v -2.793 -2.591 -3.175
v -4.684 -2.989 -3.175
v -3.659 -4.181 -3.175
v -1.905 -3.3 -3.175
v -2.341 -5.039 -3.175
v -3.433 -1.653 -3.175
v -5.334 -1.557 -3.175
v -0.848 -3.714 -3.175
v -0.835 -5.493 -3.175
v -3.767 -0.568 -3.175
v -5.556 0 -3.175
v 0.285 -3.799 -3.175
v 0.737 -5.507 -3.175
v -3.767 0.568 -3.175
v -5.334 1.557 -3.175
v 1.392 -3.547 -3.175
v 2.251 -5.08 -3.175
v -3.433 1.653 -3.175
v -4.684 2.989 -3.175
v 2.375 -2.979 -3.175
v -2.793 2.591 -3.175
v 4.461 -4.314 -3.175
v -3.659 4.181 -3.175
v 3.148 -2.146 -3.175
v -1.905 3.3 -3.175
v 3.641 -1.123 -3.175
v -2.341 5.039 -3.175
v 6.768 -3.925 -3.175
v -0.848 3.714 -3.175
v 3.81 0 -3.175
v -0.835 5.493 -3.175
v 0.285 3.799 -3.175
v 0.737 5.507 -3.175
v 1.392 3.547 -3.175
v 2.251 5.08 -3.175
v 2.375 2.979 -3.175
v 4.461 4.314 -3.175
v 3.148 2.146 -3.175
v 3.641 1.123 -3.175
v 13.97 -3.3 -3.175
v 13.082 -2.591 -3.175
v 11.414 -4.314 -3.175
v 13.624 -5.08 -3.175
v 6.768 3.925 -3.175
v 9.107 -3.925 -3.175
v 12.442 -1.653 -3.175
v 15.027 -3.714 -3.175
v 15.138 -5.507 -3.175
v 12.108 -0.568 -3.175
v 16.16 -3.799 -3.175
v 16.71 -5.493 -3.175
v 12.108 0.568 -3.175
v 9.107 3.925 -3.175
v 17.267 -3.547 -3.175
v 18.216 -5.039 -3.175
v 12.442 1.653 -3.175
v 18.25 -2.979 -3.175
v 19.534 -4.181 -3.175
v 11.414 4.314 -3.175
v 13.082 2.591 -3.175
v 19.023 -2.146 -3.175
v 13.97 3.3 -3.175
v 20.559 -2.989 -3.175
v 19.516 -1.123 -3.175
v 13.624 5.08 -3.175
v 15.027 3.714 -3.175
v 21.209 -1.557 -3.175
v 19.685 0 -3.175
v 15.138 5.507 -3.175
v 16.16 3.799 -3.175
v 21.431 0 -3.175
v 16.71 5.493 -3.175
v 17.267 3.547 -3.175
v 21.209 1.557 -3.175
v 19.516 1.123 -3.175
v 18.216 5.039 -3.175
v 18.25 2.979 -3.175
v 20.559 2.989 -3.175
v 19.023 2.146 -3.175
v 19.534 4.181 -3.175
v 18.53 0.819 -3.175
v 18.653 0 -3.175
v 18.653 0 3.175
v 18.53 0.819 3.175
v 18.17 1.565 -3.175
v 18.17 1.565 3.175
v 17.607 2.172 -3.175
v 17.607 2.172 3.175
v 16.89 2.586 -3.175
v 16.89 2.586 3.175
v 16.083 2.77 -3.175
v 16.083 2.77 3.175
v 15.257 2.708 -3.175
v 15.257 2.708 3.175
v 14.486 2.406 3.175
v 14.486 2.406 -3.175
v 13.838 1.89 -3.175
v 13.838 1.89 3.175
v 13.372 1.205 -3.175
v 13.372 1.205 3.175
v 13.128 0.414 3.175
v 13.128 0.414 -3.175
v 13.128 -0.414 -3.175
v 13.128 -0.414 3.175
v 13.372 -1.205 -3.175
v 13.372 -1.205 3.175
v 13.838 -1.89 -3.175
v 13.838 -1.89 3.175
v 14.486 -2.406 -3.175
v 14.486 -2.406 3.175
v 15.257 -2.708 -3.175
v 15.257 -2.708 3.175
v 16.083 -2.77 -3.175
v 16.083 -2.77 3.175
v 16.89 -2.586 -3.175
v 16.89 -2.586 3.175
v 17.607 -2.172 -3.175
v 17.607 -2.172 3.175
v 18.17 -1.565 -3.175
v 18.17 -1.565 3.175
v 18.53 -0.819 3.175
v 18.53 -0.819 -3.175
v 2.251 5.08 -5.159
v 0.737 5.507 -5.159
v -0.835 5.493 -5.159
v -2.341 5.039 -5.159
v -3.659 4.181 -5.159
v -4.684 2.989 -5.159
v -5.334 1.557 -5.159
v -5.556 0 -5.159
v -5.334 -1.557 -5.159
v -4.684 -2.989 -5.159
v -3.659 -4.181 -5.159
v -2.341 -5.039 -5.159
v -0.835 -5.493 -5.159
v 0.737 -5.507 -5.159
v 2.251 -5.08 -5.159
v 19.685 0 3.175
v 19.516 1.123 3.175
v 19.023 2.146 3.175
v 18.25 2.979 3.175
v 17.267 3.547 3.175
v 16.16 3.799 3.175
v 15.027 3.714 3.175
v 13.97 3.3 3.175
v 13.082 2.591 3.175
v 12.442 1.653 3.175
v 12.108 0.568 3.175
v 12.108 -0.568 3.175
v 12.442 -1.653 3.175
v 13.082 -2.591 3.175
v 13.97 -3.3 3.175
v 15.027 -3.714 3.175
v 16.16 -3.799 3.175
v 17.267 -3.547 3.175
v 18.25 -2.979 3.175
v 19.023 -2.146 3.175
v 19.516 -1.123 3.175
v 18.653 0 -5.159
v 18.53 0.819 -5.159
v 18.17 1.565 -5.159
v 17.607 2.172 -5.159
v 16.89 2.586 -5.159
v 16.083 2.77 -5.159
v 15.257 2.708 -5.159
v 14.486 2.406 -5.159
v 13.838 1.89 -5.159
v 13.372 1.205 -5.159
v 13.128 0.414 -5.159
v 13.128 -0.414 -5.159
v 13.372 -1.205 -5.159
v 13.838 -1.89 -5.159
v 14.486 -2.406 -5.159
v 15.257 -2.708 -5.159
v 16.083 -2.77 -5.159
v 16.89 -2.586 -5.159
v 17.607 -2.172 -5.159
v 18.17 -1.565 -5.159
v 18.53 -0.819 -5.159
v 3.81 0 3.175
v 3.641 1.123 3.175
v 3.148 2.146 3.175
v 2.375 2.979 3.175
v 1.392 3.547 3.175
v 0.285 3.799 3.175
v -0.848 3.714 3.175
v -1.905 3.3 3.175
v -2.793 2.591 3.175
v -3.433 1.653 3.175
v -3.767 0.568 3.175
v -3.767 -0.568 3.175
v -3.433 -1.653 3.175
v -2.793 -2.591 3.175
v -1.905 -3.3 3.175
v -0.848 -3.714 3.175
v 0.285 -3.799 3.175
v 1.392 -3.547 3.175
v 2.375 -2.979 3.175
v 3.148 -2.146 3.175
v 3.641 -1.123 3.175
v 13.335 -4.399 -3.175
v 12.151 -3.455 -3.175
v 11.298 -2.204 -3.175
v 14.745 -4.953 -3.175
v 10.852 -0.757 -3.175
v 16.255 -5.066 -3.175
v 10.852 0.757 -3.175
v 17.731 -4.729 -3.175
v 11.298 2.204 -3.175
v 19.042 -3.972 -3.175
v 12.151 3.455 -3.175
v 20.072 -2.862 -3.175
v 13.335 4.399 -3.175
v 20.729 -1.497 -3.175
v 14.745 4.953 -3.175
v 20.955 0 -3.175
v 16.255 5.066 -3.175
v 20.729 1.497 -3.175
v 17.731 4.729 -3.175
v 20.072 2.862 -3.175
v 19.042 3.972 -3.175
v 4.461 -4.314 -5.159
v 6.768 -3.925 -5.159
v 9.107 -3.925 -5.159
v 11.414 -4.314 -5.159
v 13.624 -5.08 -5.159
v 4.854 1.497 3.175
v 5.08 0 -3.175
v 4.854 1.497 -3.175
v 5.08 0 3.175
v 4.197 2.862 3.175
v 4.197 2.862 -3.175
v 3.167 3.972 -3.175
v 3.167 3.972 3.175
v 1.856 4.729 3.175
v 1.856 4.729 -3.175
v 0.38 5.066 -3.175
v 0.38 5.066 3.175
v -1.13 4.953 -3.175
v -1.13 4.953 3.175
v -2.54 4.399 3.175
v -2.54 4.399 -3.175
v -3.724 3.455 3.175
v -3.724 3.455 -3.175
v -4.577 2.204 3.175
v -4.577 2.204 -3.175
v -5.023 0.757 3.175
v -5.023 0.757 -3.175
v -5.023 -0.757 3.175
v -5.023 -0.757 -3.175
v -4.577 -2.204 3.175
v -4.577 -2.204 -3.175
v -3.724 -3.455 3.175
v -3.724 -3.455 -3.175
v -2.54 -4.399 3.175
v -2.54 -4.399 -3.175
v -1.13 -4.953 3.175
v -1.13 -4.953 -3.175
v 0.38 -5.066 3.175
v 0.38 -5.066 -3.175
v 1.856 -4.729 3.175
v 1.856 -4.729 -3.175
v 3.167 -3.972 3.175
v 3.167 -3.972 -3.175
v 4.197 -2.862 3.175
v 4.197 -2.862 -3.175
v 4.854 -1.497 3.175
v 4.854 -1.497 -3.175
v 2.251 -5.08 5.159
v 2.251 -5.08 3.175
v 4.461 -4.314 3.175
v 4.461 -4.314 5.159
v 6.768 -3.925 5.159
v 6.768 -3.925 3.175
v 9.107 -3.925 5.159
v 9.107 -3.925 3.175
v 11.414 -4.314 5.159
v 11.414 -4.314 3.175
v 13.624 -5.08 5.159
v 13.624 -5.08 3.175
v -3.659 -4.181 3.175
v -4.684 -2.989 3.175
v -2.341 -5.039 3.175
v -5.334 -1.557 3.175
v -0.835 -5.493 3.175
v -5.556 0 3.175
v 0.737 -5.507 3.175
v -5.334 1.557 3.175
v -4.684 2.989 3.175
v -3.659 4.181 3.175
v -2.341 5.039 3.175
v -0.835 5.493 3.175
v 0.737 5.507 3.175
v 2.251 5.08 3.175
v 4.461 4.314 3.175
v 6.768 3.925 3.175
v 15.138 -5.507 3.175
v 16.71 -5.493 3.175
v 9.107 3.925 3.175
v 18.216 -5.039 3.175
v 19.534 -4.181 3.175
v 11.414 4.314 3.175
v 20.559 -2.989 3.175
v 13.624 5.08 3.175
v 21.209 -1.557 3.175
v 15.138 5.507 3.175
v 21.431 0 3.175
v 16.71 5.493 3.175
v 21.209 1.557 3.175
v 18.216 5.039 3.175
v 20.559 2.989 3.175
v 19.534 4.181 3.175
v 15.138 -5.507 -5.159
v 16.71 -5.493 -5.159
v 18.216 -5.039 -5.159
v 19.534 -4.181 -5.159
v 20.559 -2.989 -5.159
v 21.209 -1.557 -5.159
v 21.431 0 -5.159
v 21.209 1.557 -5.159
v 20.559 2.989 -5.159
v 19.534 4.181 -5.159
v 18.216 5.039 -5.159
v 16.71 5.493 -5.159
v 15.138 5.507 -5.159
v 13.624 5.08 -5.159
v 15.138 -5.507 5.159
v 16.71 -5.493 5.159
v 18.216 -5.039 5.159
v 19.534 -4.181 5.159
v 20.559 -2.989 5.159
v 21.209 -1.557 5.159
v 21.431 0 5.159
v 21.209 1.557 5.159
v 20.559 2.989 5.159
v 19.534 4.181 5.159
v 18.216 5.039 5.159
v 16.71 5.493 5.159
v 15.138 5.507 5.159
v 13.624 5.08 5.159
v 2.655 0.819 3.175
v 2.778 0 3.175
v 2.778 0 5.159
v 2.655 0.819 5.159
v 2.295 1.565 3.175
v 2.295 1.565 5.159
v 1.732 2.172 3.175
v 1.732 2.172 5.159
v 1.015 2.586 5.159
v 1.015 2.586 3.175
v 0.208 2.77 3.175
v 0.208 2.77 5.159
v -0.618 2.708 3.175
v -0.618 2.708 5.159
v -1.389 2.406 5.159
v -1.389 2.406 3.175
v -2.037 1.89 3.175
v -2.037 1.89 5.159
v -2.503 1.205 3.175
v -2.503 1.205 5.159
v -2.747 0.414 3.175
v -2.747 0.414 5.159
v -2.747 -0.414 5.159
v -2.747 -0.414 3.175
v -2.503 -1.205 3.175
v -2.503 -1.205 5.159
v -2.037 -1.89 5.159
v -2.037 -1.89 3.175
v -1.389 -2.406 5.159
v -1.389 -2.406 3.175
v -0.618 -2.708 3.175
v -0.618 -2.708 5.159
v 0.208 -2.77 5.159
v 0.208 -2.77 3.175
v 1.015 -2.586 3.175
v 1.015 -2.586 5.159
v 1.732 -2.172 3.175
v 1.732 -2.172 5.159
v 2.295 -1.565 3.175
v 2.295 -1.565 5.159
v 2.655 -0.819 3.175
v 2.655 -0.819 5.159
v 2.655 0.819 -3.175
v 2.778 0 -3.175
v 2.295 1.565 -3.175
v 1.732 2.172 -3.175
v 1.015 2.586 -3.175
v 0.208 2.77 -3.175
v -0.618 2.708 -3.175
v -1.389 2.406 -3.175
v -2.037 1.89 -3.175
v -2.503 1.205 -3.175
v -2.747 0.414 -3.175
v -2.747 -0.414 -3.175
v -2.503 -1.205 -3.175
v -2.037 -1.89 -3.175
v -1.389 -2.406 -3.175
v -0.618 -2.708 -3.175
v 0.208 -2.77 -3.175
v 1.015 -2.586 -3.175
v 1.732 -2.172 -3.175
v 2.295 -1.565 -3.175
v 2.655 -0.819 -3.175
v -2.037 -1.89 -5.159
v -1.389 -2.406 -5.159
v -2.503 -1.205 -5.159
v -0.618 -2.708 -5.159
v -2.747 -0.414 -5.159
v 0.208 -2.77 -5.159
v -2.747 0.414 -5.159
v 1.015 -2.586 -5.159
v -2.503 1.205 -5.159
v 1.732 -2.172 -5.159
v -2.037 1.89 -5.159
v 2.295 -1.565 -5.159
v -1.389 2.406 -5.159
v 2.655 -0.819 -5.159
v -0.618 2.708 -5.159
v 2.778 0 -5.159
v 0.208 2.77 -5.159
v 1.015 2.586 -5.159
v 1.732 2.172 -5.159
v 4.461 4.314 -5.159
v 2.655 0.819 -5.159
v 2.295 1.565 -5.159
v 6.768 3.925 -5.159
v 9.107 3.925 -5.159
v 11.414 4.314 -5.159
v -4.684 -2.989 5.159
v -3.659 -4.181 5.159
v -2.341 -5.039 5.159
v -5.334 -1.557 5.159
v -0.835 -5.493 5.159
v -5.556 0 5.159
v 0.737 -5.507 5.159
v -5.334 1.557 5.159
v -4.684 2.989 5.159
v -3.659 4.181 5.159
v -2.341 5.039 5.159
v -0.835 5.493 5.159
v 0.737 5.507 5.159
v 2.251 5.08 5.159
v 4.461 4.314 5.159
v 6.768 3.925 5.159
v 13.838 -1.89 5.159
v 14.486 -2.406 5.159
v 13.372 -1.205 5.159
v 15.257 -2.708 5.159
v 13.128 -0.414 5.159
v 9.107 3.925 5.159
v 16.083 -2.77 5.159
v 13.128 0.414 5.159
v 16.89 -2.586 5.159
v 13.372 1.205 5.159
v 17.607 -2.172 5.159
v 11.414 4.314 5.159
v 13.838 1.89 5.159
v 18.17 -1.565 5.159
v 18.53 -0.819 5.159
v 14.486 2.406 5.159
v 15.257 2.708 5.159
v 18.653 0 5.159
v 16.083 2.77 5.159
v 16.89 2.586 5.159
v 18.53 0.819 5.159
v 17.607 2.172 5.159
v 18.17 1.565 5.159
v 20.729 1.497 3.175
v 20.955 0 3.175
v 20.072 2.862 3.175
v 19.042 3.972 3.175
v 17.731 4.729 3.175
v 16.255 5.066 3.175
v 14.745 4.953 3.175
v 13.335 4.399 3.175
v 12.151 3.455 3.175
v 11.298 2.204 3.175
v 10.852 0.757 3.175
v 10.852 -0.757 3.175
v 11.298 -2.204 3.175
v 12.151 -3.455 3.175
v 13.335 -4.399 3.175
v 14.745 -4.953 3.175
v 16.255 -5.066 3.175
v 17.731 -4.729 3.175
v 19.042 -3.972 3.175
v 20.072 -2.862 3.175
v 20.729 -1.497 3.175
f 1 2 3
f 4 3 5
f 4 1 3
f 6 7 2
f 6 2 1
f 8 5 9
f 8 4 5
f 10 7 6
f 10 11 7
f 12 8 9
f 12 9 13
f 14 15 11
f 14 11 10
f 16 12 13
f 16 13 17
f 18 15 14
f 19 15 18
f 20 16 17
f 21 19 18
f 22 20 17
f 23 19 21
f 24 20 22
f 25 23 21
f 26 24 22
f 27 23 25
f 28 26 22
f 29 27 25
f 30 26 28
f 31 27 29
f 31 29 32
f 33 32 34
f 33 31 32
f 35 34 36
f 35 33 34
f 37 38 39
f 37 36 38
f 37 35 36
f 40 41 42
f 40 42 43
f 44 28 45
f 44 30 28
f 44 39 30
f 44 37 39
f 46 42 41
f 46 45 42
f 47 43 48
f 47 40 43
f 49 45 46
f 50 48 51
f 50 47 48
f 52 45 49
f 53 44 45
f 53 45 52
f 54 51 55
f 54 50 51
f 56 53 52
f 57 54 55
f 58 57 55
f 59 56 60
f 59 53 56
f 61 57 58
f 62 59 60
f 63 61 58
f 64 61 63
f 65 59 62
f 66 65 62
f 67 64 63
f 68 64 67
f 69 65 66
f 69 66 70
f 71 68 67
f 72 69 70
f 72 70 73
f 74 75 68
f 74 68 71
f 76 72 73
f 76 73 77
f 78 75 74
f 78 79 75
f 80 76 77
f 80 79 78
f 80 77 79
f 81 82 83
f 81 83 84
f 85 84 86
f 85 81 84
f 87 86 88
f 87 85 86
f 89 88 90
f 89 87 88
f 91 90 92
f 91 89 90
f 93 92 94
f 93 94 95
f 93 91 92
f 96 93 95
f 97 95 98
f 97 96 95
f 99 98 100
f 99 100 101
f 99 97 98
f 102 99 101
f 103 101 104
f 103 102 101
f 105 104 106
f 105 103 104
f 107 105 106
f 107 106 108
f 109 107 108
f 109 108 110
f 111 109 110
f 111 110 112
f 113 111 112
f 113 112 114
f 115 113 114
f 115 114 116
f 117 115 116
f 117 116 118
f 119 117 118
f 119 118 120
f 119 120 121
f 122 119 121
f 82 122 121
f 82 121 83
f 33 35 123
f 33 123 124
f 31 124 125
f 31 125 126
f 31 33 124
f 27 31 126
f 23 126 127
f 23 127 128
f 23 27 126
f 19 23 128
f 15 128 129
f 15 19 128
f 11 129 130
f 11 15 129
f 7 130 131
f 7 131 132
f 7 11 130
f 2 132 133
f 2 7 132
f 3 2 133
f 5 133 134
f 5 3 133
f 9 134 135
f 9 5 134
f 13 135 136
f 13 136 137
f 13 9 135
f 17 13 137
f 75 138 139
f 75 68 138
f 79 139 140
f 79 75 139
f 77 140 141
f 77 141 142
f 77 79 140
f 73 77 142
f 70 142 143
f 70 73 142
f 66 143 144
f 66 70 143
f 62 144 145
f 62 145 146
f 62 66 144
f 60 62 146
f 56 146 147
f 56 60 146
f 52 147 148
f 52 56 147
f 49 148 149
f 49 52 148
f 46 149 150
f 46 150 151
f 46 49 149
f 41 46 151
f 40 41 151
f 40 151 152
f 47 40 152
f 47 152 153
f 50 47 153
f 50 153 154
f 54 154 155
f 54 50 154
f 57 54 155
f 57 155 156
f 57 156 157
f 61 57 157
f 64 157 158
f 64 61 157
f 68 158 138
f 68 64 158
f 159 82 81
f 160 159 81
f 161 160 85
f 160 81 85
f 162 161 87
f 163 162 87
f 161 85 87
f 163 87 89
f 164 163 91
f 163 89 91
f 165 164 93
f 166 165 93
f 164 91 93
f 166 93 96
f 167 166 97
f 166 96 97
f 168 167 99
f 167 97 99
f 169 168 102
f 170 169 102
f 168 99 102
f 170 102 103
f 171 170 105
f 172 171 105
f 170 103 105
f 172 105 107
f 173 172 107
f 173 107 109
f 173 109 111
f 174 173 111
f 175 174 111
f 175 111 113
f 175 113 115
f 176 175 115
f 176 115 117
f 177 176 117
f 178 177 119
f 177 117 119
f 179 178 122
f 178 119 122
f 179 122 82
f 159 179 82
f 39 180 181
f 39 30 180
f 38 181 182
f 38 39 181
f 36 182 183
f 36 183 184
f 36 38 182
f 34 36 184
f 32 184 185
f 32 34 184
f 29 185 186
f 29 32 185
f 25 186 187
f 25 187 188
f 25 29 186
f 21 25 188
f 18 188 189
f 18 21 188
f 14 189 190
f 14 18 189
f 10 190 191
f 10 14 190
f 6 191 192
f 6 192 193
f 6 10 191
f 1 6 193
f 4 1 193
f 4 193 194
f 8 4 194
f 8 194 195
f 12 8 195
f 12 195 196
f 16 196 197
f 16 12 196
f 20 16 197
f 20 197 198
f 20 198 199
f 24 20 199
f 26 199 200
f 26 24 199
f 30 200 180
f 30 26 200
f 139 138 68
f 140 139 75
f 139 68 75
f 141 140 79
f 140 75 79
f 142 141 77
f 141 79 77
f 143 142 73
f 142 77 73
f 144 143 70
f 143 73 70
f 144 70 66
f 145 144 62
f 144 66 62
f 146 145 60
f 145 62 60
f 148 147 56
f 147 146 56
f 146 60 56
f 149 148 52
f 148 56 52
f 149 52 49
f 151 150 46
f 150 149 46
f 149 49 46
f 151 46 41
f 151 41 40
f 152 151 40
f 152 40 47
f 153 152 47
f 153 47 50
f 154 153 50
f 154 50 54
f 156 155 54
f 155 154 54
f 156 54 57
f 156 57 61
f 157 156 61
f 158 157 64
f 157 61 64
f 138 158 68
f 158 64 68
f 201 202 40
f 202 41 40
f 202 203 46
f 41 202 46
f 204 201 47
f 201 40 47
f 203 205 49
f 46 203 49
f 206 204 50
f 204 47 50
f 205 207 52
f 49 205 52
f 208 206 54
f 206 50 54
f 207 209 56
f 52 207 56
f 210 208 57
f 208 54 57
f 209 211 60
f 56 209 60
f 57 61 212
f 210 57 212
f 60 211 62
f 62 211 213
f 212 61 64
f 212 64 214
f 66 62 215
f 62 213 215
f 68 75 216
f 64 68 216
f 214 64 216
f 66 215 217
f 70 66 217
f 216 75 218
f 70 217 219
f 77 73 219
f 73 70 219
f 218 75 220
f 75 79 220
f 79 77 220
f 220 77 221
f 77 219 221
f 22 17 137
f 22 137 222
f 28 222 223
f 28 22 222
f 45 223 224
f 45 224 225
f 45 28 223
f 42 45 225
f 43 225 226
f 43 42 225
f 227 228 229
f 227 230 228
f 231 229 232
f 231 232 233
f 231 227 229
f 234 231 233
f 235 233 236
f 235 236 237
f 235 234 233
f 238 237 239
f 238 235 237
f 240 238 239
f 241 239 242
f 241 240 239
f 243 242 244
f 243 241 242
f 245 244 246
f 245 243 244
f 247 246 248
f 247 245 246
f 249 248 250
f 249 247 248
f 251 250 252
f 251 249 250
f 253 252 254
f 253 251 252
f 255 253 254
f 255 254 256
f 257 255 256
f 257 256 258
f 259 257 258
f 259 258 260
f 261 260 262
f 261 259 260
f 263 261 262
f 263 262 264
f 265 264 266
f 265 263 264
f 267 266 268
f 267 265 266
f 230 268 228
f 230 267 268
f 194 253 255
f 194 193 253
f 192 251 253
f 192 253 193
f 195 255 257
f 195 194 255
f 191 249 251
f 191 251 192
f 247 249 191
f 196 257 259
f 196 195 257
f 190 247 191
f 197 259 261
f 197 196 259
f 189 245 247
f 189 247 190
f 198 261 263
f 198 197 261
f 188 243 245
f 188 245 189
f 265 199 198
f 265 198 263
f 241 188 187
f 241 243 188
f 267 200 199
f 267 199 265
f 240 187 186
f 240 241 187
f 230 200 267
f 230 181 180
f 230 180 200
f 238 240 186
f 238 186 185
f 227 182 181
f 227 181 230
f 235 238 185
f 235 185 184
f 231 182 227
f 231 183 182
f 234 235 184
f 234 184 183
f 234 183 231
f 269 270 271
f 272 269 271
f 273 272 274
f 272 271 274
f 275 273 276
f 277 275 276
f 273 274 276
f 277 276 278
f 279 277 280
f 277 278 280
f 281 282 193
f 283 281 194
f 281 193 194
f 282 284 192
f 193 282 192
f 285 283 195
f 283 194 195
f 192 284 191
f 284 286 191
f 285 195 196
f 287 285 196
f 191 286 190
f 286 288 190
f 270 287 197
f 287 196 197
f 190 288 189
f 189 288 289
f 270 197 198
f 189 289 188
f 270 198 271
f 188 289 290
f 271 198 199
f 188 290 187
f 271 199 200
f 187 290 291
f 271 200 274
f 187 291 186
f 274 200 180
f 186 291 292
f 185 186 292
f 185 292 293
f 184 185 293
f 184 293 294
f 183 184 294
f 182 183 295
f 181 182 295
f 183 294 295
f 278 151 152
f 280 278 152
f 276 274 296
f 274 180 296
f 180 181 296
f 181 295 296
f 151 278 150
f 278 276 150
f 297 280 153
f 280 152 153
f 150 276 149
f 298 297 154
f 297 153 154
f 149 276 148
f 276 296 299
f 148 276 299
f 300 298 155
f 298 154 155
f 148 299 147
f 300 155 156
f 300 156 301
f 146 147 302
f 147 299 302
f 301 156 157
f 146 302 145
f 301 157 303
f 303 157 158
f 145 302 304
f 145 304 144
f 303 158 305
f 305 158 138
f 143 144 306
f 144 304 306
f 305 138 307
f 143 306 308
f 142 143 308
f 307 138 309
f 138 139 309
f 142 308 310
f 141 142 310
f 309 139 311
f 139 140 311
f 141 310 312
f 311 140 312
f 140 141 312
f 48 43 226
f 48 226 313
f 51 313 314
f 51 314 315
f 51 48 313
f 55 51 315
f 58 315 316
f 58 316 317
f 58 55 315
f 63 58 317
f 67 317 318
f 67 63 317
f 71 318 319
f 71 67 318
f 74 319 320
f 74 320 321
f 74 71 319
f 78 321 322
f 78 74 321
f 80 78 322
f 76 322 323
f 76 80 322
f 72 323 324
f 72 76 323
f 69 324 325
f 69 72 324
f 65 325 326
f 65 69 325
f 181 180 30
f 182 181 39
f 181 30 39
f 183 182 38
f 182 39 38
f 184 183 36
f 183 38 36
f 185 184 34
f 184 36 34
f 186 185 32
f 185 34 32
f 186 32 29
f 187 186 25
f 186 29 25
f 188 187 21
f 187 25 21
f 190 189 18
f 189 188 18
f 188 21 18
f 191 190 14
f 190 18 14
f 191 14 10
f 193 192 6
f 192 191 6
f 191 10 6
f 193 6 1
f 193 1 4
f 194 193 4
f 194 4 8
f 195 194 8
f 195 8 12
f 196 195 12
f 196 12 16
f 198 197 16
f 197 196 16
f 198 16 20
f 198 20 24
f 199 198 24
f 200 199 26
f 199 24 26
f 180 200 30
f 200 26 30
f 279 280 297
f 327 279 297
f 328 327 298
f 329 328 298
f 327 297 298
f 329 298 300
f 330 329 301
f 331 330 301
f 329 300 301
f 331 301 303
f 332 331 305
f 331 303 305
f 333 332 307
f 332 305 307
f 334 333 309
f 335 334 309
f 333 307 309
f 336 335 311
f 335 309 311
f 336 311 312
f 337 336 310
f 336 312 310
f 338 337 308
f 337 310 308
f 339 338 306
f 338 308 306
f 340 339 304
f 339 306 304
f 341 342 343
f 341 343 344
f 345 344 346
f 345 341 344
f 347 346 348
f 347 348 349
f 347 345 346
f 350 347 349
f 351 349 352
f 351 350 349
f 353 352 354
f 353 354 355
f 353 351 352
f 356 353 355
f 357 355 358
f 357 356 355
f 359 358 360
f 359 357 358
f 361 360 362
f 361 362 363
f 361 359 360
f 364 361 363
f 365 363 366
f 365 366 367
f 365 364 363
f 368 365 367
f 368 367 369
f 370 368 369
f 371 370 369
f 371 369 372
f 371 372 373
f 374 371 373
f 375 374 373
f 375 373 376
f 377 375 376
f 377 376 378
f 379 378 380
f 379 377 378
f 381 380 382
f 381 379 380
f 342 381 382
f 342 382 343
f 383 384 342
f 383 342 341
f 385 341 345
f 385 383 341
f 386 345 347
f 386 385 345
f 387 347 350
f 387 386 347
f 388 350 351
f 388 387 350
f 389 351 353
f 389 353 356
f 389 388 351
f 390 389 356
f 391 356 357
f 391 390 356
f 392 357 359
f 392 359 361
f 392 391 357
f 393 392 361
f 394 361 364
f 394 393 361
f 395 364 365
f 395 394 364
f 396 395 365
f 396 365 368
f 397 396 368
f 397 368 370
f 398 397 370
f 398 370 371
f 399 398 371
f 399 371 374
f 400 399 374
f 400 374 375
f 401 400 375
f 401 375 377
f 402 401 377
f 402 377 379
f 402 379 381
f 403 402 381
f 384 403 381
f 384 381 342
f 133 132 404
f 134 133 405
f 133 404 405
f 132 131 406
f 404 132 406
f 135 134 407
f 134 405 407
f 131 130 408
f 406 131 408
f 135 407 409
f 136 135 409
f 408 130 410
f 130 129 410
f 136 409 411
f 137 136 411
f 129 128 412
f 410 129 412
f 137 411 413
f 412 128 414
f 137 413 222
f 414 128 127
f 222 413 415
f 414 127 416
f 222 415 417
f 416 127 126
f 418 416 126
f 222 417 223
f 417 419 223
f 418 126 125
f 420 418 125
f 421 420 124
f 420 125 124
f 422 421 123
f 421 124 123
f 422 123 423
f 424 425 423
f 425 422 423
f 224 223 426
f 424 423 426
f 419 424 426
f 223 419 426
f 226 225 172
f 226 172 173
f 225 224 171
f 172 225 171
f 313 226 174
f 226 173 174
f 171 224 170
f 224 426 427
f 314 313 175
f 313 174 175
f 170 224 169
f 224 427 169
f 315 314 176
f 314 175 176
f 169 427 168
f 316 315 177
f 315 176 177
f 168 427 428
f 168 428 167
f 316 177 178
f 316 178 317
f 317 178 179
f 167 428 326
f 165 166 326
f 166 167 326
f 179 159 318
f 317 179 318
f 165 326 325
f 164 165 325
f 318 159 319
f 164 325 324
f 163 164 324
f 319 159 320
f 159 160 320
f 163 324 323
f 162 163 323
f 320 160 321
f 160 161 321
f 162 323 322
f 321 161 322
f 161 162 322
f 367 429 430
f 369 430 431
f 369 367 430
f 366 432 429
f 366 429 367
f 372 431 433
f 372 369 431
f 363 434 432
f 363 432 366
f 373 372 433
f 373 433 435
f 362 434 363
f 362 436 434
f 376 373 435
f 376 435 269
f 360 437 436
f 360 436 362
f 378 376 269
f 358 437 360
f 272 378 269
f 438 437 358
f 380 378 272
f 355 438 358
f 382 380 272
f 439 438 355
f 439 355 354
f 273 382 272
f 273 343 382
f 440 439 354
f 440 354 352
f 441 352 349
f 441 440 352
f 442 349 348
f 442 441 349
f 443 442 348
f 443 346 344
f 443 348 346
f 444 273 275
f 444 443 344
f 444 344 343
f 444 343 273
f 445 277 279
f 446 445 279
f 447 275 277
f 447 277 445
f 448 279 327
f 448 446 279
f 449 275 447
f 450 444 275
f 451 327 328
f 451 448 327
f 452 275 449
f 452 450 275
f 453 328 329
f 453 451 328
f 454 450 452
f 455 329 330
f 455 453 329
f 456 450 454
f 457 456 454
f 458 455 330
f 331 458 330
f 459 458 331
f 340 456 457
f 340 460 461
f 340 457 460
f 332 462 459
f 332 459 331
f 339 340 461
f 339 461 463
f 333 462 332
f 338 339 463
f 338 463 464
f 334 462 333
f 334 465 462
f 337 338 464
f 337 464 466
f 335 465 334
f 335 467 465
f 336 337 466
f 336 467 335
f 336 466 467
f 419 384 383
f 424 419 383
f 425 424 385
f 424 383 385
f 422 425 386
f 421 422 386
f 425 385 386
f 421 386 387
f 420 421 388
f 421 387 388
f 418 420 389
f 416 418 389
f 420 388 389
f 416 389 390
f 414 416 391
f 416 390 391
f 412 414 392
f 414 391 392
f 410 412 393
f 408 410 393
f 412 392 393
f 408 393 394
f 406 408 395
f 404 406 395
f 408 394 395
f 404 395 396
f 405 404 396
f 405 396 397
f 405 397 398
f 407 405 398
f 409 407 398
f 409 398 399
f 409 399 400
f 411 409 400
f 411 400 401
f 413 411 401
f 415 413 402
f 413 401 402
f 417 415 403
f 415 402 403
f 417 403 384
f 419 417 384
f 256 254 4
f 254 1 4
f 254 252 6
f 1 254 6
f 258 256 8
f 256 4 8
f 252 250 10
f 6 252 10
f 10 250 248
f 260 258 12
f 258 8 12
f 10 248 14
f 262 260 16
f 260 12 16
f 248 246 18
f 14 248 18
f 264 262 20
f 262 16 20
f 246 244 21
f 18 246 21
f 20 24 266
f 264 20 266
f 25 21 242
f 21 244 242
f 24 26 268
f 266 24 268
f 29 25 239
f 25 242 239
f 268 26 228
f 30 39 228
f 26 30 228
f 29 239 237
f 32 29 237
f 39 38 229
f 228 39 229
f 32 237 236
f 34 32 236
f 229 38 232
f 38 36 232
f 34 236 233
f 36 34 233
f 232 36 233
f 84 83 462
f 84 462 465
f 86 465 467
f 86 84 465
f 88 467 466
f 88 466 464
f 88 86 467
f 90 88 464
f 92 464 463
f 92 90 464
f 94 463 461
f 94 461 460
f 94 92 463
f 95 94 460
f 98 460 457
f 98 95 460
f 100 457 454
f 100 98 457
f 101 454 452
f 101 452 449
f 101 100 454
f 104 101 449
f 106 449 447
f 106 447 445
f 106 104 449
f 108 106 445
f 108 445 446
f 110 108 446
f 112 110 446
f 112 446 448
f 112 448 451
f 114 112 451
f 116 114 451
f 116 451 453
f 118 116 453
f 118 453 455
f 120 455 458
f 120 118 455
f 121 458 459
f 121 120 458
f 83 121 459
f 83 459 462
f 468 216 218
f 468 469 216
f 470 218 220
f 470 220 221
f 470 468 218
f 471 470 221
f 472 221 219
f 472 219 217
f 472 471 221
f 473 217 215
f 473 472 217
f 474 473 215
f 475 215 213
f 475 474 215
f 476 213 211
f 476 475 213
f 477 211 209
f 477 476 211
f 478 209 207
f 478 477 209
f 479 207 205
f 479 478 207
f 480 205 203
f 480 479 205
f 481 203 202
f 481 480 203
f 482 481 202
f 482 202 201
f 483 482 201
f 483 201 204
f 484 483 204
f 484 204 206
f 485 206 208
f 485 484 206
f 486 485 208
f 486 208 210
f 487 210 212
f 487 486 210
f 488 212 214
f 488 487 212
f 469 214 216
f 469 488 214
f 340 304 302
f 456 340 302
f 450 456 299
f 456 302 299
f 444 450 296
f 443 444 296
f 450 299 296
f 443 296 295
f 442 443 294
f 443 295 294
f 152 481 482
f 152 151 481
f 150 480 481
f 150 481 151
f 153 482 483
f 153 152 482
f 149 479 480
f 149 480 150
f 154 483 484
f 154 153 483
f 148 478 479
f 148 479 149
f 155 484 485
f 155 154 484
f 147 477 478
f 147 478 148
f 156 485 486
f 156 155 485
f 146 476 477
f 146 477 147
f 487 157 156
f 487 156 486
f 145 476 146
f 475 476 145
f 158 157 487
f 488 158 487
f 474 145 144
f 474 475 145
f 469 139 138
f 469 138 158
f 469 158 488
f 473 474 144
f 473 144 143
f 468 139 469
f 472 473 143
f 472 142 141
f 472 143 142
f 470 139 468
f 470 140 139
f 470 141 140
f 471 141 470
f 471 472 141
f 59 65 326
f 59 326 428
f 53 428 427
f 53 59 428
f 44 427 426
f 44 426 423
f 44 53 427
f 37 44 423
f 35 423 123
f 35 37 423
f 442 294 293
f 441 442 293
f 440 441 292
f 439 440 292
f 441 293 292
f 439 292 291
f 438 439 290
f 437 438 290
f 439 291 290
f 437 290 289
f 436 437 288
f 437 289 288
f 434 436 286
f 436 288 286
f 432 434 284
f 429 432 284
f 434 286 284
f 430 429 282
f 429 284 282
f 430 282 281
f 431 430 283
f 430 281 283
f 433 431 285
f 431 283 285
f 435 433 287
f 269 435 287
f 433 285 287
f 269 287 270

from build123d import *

# Parameters (mm, degrees)
SKETCH1_R             = 5.08
SKETCH1_R_2           = 3.81
BOSS_EXTRUDE1_DEPTH   = 3.175
BOSS_EXTRUDE1_2_DEPTH = 3.175
SKETCH2_R             = 2.778125
BOSS_EXTRUDE2_DEPTH   = 1.984375
SKETCH3_R             = 3.81
SKETCH3_R_2           = 2.778125
BOSS_EXTRUDE3_DEPTH   = 8.334375


with BuildPart() as part:
    # Sketch1 → Boss-Extrude1 (new body, symmetric)
    with BuildSketch(Plane.XY):
        Circle(SKETCH1_R)
        Circle(SKETCH1_R_2, mode=Mode.SUBTRACT)
    extrude(amount=BOSS_EXTRUDE1_DEPTH, both=True)


with BuildPart() as body_2:
    # Sketch1 → Boss-Extrude1 2 (new body, symmetric)
    with BuildSketch(Plane.XY):
        with Locations((15.875, 0)):
            Circle(SKETCH1_R)
        with Locations((15.875, 0)):
            Circle(SKETCH1_R_2, mode=Mode.SUBTRACT)
    extrude(amount=BOSS_EXTRUDE1_2_DEPTH, both=True)


with BuildPart() as body_3:
    # Sketch2 → Boss-Extrude2 (new body)
    with BuildSketch(Plane.XY.offset(3.175)):
        with BuildLine():
            ThreePointArc((2.250669692, 5.08), (-5.55625, 0), (2.250669692, -5.08))
            ThreePointArc((2.250669692, -5.08), (7.9375, -3.876645752), (13.624330308, -5.08))
            ThreePointArc((13.624330308, -5.08), (21.43125, 0), (13.624330308, 5.08))
            ThreePointArc((13.624330308, 5.08), (7.9375, 3.876645752), (2.250669692, 5.08))
        make_face()
        Circle(SKETCH2_R, mode=Mode.SUBTRACT)
        with Locations((15.875, 0)):
            Circle(SKETCH2_R, mode=Mode.SUBTRACT)
    extrude(amount=BOSS_EXTRUDE2_DEPTH)


with BuildPart() as body_4:
    # Mirror1: mirrored copy
    add(body_3.part.mirror(Plane.XY))


    add(body_3.part)  # Boss-Extrude3 merges body 3
    # Sketch3 → Boss-Extrude3 (add)
    with BuildSketch(Plane.XY.offset(-3.175)):
        Circle(SKETCH3_R)
        Circle(SKETCH3_R_2, mode=Mode.SUBTRACT)
        with Locations((15.875, 0)):
            Circle(SKETCH3_R)
        with Locations((15.875, 0)):
            Circle(SKETCH3_R_2, mode=Mode.SUBTRACT)
    extrude(amount=BOSS_EXTRUDE3_DEPTH)


solid = Compound([part.part, body_2.part, body_4.part])
